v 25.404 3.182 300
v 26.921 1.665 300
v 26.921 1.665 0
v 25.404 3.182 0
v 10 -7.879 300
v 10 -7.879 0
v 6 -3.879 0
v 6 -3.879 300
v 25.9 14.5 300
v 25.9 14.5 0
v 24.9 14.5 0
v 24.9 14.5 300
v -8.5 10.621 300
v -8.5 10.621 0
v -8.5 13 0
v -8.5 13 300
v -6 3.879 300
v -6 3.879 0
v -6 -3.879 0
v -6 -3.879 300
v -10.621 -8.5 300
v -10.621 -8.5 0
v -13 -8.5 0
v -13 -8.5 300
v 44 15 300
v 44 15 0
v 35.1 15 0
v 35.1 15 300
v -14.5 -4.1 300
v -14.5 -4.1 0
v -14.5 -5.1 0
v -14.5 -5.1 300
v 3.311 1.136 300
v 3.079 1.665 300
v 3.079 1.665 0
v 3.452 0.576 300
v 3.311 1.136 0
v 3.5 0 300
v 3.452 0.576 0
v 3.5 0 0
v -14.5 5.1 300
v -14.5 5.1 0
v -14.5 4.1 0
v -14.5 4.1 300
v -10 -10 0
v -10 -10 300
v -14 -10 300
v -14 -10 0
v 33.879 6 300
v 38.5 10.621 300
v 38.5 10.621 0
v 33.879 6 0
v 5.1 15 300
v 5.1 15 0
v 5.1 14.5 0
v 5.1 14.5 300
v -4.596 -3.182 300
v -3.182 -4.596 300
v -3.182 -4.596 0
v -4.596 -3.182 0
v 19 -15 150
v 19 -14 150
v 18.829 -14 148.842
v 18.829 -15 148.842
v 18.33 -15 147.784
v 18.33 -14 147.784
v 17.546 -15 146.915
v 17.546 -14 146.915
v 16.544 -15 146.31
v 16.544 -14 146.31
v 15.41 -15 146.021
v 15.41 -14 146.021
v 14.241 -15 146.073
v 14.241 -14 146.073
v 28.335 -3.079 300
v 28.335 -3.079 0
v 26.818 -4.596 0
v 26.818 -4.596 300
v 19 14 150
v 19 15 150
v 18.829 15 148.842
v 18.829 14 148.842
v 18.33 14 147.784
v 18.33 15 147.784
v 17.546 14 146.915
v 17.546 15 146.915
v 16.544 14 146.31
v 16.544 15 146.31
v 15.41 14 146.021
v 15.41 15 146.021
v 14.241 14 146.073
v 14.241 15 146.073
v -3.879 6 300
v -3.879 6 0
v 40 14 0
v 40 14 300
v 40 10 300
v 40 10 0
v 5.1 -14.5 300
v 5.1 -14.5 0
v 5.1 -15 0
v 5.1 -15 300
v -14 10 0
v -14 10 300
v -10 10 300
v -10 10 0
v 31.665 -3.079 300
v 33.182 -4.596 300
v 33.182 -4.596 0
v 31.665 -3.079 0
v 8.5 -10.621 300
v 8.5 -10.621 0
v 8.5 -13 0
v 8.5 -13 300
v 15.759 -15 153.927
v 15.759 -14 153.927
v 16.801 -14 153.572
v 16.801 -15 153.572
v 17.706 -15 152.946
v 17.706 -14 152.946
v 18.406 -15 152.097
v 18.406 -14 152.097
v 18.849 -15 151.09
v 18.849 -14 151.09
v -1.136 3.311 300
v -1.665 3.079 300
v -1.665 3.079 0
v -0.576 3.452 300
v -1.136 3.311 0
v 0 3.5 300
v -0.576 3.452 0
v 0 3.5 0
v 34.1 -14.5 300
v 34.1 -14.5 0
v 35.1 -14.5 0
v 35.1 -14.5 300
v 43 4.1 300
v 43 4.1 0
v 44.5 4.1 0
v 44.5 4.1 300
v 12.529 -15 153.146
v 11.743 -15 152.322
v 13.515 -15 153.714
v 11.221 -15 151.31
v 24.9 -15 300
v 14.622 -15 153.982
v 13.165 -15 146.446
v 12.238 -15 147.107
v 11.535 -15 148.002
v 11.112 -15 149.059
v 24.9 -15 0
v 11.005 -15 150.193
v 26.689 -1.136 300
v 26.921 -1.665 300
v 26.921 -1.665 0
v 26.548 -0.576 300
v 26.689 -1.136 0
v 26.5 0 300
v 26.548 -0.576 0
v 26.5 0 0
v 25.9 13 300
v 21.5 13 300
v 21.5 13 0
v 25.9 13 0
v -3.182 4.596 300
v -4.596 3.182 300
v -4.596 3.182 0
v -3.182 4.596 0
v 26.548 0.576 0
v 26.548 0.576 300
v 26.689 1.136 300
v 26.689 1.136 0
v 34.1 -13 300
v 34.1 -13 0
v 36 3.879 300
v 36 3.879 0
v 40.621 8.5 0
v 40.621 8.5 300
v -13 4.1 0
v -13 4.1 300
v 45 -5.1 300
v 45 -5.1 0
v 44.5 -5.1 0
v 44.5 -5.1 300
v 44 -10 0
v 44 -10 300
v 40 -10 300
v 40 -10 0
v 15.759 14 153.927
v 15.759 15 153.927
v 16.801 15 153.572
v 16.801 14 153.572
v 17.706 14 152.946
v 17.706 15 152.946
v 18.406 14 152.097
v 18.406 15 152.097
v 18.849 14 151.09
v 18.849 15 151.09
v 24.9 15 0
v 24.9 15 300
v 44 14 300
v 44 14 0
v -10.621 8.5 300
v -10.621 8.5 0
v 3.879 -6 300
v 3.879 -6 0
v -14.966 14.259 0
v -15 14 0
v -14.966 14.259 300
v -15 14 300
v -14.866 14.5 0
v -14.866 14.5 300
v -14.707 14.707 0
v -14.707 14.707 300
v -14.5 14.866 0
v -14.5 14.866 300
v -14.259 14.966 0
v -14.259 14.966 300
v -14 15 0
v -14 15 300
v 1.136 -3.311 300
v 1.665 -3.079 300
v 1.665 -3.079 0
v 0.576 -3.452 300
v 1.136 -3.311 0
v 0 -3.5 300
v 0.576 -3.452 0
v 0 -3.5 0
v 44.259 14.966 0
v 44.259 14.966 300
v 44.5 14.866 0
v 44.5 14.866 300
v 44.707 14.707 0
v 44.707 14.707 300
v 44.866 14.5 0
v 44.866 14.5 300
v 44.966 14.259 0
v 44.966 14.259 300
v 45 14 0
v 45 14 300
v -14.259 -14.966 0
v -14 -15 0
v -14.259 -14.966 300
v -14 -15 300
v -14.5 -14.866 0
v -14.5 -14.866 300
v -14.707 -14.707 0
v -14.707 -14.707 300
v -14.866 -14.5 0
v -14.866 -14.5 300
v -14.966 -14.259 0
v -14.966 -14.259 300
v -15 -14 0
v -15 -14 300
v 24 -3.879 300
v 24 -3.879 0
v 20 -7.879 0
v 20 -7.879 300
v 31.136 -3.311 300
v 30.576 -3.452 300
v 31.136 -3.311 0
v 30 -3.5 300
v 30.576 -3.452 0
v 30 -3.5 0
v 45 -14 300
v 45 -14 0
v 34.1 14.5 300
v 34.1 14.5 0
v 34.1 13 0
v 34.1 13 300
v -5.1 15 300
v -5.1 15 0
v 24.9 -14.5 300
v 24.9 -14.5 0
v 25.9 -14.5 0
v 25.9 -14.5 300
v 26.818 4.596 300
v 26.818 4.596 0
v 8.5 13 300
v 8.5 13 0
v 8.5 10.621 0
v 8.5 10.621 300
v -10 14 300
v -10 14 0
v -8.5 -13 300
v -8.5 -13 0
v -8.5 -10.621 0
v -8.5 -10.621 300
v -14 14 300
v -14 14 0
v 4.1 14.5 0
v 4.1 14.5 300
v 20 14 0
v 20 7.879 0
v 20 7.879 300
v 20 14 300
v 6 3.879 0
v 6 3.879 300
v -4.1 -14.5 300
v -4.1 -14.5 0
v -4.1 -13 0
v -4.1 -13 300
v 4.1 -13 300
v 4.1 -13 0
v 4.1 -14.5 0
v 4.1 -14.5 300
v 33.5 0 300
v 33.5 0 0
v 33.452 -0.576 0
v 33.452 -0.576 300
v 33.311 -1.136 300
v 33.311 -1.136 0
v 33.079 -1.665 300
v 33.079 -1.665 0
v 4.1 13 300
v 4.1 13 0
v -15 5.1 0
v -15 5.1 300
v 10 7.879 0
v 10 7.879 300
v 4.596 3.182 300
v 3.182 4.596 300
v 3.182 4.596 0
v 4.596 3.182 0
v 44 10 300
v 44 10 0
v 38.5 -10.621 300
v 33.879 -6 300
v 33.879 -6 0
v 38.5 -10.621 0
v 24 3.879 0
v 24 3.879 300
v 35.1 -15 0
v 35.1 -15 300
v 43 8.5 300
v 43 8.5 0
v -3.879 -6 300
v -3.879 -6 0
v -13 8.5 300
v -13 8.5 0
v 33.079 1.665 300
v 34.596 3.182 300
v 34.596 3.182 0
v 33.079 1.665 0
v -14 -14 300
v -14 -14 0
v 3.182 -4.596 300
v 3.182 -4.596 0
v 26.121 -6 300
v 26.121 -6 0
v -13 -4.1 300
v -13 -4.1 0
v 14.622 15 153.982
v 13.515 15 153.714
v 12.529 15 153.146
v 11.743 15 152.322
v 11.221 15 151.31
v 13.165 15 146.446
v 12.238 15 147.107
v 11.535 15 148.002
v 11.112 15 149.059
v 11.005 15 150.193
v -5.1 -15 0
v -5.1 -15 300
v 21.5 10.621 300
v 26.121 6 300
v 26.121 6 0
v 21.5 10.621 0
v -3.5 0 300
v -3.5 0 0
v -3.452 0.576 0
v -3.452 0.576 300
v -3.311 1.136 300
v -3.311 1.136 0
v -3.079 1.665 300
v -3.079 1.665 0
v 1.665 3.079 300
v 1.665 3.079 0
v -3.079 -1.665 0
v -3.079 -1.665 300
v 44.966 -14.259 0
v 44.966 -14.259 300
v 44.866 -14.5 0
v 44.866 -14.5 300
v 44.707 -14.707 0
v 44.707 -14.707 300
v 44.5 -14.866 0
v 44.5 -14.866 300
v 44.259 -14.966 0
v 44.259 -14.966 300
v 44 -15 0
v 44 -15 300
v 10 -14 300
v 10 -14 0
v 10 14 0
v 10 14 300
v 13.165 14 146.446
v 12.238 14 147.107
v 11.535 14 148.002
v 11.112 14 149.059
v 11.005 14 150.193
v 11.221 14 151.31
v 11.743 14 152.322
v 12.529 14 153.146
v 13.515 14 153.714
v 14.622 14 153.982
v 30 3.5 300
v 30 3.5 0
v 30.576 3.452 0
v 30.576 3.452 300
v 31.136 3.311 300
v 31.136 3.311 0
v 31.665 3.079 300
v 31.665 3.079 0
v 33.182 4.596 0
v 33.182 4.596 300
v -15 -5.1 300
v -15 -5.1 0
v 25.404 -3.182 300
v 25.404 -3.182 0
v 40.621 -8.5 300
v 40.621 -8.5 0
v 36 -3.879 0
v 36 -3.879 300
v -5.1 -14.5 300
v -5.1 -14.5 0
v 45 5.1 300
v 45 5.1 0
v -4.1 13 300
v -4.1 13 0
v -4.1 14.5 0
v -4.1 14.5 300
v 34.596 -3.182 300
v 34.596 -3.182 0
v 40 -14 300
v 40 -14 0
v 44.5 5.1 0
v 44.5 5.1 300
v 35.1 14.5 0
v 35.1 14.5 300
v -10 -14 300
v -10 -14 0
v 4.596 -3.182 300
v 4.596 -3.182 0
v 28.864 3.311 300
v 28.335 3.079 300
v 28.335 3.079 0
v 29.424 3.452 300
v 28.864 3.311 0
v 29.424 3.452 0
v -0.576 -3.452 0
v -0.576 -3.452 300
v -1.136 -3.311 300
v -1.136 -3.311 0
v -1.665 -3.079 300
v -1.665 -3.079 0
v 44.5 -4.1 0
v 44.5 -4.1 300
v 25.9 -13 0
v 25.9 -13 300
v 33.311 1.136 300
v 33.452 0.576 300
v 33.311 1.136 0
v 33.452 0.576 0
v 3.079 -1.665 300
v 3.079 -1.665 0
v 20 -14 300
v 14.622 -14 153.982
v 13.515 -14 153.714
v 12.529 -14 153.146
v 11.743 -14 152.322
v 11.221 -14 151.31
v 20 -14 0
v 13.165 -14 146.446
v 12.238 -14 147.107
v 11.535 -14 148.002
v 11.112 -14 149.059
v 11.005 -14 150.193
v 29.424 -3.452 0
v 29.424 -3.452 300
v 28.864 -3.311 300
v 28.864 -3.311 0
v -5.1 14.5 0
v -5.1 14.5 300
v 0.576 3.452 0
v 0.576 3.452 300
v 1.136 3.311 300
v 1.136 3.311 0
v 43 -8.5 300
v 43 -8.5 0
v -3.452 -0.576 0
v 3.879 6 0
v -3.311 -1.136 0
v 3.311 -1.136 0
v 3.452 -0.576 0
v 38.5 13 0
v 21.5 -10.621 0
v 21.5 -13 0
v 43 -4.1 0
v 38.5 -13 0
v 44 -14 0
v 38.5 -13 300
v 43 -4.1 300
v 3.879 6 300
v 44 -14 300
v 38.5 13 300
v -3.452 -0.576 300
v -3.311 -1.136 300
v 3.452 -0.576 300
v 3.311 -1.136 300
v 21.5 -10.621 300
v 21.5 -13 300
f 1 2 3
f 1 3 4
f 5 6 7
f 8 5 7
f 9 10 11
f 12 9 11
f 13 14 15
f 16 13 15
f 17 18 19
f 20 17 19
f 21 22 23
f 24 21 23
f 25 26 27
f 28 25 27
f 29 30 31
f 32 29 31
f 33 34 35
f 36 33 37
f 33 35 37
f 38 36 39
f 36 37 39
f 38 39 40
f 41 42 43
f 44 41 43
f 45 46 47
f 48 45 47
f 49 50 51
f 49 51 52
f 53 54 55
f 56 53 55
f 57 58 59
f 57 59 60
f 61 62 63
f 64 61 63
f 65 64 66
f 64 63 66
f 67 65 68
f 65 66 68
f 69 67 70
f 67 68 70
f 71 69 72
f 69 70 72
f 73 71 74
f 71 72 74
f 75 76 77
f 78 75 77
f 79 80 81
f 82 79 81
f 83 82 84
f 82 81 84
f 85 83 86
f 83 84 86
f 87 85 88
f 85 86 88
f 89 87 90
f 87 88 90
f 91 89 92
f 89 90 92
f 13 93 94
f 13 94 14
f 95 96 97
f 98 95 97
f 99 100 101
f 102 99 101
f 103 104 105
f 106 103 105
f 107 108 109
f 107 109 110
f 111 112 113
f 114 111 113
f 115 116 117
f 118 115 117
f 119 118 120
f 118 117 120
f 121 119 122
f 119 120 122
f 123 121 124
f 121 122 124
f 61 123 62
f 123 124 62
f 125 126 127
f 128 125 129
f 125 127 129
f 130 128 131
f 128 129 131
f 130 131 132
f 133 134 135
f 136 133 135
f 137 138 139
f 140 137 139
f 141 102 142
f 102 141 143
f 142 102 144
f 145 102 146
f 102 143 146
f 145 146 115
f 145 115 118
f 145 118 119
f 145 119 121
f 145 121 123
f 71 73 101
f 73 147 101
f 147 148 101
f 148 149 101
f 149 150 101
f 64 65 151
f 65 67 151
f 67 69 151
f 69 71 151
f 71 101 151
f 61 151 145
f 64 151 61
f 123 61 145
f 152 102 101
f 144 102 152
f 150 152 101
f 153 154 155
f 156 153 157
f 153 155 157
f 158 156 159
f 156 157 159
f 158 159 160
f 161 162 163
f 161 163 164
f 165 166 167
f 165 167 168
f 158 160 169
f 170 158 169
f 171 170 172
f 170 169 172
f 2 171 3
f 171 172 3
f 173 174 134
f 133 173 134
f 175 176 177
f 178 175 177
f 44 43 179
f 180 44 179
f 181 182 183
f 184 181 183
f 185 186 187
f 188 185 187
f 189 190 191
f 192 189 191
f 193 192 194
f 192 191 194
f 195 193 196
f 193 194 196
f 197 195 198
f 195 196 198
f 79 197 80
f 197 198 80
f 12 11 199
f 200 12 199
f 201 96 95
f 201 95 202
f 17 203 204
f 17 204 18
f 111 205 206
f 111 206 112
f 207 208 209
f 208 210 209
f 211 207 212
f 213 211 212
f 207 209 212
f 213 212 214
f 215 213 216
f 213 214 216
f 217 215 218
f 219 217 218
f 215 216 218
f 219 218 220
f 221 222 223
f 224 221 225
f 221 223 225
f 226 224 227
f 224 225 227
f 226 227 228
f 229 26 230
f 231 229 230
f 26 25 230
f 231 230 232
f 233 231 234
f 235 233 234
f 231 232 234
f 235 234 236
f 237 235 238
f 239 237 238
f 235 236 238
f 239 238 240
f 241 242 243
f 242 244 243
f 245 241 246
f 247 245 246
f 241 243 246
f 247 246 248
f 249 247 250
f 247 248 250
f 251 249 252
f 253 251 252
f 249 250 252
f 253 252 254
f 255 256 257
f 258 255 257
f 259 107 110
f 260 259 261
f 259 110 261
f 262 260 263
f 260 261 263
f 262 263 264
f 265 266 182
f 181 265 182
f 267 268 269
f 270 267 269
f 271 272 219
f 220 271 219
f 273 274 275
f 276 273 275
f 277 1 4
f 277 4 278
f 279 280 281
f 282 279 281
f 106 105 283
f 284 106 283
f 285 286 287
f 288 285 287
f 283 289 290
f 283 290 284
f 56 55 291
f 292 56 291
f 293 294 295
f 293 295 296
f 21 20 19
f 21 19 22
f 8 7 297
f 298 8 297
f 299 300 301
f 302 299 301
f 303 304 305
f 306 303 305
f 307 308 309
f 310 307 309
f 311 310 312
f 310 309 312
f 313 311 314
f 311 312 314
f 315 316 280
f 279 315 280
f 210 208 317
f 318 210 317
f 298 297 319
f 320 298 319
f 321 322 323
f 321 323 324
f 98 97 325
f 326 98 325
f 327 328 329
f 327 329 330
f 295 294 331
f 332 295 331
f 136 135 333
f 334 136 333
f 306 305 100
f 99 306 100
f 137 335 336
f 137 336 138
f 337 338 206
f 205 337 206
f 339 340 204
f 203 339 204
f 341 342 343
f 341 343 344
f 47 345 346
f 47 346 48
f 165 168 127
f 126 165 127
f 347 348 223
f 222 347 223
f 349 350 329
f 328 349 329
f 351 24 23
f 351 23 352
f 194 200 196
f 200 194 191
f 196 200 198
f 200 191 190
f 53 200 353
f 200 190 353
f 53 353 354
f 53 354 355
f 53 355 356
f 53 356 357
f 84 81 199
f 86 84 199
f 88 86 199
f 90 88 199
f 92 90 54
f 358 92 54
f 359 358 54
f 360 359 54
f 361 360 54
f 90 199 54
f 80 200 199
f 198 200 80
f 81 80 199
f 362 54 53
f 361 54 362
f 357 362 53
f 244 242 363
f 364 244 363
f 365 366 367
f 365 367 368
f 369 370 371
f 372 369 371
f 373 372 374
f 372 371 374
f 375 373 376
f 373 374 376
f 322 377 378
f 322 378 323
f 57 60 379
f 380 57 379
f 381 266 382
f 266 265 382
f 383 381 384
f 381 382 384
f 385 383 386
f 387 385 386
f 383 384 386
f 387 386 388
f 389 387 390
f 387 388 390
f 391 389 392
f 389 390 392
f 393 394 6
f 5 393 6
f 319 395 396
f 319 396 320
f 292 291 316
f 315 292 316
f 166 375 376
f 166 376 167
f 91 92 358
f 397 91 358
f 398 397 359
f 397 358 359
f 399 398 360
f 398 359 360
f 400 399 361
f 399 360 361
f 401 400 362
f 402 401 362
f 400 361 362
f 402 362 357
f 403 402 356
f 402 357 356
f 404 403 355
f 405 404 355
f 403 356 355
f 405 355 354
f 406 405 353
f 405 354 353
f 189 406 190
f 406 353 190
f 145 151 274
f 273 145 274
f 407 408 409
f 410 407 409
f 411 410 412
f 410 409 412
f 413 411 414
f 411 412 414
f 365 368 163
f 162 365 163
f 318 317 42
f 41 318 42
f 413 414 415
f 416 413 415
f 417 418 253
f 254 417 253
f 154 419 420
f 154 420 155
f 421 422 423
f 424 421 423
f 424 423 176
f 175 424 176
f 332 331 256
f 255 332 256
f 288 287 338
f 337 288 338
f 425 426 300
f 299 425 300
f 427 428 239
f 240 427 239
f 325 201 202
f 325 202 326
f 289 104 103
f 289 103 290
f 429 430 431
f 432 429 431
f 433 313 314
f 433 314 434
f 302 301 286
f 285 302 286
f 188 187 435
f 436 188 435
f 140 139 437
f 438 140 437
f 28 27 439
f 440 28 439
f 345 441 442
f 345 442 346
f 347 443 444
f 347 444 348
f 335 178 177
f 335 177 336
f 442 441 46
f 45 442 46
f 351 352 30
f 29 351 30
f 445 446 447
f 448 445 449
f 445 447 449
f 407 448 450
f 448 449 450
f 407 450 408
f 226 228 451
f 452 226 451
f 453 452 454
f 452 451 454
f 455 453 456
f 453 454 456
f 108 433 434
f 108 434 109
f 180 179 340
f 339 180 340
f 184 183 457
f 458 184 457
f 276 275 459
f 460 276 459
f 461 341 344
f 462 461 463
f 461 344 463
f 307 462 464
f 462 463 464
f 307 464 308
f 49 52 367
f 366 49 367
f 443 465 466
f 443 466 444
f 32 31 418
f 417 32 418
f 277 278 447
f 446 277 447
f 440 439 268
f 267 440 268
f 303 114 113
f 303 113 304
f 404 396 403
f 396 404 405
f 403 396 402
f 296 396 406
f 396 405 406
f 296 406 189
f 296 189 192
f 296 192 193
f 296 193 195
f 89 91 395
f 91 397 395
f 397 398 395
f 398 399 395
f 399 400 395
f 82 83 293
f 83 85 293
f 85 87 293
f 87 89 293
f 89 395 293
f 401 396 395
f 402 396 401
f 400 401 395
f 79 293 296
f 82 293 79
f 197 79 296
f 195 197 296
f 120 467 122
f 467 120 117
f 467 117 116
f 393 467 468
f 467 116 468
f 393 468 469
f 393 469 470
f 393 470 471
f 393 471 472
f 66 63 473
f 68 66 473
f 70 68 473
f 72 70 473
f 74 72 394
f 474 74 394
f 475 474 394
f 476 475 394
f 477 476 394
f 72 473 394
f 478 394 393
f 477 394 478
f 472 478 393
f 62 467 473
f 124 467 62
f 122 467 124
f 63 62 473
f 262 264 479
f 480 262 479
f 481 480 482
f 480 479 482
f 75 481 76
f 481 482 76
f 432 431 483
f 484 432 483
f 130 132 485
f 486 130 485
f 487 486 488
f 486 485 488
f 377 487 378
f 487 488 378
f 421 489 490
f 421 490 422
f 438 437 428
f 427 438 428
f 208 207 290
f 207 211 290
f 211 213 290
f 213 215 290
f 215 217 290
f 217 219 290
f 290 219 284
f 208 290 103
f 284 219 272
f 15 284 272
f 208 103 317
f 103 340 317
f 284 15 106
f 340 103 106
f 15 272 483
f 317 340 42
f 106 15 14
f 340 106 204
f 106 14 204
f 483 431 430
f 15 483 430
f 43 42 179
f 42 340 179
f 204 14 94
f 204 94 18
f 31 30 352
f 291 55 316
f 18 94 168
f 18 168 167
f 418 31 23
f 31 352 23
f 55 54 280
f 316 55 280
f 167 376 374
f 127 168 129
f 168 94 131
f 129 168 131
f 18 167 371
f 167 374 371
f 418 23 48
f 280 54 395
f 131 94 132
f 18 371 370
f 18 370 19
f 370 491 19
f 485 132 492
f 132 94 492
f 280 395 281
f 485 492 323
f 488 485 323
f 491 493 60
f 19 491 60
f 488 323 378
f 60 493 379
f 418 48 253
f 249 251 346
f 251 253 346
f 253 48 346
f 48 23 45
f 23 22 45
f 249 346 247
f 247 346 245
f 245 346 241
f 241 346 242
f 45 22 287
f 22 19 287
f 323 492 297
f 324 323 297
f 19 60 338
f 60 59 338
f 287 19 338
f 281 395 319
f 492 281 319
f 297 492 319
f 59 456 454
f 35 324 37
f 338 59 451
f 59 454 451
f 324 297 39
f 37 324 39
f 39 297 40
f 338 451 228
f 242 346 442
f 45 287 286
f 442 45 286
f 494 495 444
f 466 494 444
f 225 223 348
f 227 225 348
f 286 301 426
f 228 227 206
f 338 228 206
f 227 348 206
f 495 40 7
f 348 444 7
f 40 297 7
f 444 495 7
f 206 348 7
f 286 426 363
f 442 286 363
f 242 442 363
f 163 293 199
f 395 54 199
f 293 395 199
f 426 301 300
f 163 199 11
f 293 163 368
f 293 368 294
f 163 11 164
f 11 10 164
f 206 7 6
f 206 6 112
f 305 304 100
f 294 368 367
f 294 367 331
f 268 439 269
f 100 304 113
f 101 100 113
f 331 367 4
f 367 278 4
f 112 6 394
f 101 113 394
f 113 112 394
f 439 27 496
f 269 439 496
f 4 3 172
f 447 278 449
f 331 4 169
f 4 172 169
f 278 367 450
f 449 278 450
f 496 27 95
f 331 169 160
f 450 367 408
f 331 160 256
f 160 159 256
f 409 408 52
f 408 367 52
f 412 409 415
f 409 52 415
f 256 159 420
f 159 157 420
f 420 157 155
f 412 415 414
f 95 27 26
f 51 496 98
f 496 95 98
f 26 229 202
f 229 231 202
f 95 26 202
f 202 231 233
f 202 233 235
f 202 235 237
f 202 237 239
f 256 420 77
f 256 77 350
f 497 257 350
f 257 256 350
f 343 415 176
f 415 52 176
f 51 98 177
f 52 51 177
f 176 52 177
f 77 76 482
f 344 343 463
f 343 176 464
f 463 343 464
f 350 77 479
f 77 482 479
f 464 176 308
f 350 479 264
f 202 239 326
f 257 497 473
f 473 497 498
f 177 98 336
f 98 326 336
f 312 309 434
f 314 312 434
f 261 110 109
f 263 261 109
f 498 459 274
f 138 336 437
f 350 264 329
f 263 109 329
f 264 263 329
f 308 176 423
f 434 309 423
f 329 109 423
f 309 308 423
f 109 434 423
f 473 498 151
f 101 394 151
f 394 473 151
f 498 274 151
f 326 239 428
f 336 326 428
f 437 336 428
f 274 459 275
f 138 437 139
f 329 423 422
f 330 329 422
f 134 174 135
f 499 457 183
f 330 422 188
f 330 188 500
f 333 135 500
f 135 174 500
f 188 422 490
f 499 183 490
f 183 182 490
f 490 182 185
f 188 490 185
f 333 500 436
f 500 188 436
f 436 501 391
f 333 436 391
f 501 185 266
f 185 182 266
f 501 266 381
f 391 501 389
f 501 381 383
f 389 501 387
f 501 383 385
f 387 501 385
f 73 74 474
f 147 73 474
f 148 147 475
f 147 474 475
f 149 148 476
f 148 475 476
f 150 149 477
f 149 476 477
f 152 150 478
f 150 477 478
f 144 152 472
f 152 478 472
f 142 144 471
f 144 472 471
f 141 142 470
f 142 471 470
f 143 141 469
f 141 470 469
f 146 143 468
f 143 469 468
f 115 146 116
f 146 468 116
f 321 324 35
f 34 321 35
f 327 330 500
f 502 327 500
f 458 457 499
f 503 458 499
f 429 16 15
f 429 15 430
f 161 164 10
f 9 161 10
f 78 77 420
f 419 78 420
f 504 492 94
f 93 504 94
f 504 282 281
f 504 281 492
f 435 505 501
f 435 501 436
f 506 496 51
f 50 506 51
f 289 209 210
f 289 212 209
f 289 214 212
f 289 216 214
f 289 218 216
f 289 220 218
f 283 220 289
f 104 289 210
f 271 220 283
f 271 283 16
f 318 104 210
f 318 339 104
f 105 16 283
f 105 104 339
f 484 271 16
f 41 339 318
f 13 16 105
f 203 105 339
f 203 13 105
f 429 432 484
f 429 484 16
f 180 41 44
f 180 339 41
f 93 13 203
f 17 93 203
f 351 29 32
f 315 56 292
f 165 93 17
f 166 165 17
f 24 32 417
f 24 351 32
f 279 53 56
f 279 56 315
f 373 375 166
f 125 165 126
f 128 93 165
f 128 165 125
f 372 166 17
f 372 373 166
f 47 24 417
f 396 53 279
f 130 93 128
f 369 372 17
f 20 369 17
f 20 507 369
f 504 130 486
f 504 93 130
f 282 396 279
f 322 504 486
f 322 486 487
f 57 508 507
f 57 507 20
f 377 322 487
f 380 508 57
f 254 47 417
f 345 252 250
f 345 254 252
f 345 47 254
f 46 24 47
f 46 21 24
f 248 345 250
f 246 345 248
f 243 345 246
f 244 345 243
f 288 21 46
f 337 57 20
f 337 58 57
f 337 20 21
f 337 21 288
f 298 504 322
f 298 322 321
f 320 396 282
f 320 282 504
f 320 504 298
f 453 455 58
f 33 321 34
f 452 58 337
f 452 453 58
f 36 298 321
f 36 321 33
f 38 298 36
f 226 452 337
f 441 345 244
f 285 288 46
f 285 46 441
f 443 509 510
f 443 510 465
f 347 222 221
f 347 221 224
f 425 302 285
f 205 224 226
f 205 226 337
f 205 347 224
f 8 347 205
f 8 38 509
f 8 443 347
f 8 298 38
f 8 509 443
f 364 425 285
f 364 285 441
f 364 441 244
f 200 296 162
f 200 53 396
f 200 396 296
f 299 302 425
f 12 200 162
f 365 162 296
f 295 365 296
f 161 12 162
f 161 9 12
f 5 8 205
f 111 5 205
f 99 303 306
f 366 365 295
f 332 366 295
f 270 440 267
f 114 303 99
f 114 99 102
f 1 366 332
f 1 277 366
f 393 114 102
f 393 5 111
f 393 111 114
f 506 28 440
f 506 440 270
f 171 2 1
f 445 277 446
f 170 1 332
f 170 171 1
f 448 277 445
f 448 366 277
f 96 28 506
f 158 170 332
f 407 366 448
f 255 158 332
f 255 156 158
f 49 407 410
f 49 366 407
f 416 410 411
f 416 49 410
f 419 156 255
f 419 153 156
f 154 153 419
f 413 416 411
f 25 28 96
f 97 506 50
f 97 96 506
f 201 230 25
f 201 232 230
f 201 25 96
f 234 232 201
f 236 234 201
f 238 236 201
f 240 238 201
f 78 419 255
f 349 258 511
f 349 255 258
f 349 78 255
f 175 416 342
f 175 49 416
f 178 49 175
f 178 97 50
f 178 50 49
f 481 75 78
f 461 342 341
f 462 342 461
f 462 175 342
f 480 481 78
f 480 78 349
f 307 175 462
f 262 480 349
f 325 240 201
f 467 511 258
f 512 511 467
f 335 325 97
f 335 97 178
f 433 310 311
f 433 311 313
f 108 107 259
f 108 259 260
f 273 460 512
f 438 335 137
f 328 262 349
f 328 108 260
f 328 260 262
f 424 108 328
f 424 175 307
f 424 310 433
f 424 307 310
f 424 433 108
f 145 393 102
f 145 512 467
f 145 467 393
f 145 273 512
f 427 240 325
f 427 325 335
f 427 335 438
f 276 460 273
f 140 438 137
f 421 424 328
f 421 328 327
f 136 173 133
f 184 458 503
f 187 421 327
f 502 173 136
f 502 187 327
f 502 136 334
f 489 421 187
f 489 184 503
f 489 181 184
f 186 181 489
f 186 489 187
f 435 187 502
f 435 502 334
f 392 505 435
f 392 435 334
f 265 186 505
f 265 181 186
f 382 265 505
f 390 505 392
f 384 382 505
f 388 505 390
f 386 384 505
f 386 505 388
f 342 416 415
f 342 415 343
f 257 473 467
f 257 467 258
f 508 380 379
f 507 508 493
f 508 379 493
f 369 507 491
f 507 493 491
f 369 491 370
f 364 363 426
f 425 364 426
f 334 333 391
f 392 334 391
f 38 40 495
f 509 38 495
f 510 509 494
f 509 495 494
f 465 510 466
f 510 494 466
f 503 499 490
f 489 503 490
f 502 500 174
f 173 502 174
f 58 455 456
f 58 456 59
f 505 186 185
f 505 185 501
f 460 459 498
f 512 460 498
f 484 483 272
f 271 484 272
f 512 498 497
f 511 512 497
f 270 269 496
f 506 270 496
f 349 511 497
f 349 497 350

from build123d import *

# Parameters (mm, degrees)
ESBO_O1_W                      = 4
ESBO_O1_H                      = 4
RESSALTO_EXTRUS_O1_DEPTH       = 300
PADR_OCIRCULAR1_COUNT          = 4
PADR_O_LINEAR1_COUNT           = 2
PADR_O_LINEAR1_PITCH           = 30
PADR_O_LINEAR1_COPY_1_SKETCH_W = 4
PADR_O_LINEAR1_COPY_1_SKETCH_H = 4
PADR_O_LINEAR1_COPY_1_DEPTH    = 300
PADR_O_LINEAR1_COPY_2_SKETCH_W = 4
PADR_O_LINEAR1_COPY_2_SKETCH_H = 4
PADR_O_LINEAR1_COPY_2_DEPTH    = 300
PADR_O_LINEAR1_COPY_3_SKETCH_W = 4
PADR_O_LINEAR1_COPY_3_SKETCH_H = 4
PADR_O_LINEAR1_COPY_3_DEPTH    = 300
ESBO_O4_W                      = 10
ESBO_O4_H                      = 28
CORTE_EXTRUS_O1_DEPTH          = 304.72685097
FILETE1_R                      = 1
CUT_EXTRUDE1_DEPTH             = 305.836021494


with BuildPart() as part:
    # Esboço1 → Ressalto-extrusão1 (new body)
    with BuildSketch(Plane.XY):
        with BuildLine():
            ThreePointArc((-1.664601464, 3.078815026), (-0.858529967, 3.393070335), (0, 3.5))
            Line((0, 3.5), (0, 6))
            Line((0, 6), (-3.878679656, 6))
            Line((-3.878679656, 6), (-8.5, 10.621320344))
            Line((-8.5, 10.621320344), (-8.5, 13))
            Line((-8.5, 13), (-4.1, 13))
            Line((-4.1, 13), (-4.1, 14.5))
            Line((-4.1, 14.5), (-5.1, 14.5))
            Line((-5.1, 14.5), (-5.1, 15))
            Line((-5.1, 15), (-15, 15))
            Line((-15, 15), (-15, 5.1))
            Line((-15, 5.1), (-14.5, 5.1))
            Line((-14.5, 5.1), (-14.5, 4.1))
            Line((-14.5, 4.1), (-13, 4.1))
            Line((-13, 4.1), (-13, 8.5))
            Line((-13, 8.5), (-10.621320344, 8.5))
            Line((-10.621320344, 8.5), (-6, 3.878679656))
            Line((-6, 3.878679656), (-6, 0))
            Line((-6, 0), (-3.5, 0))
            ThreePointArc((-3.5, 0), (-3.393070335, 0.858529967), (-3.078815026, 1.664601464))
            Line((-3.078815026, 1.664601464), (-4.596194078, 3.181980515))
            Line((-4.596194078, 3.181980515), (-3.181980515, 4.596194078))
            Line((-3.181980515, 4.596194078), (-1.664601464, 3.078815026))
        make_face()
        with Locations((-12, 12)):
            Rectangle(ESBO_O1_W, ESBO_O1_H, mode=Mode.SUBTRACT)
    ressalto_extrus_o1 = extrude(amount=RESSALTO_EXTRUS_O1_DEPTH)

    # PadrãoCircular1: Ressalto-extrusão1 ×4 about axis
    padr_ocircular1_axis = Axis((0, 0, 0), (0, 0, 1))
    for i in range(1, PADR_OCIRCULAR1_COUNT):
        add(ressalto_extrus_o1.rotate(padr_ocircular1_axis, i * 360 / PADR_OCIRCULAR1_COUNT))

    # Padrão linear1: Ressalto-extrusão1 ×2
    with Locations(*[(i * PADR_O_LINEAR1_PITCH, 0, 0) for i in range(1, PADR_O_LINEAR1_COUNT)]):
        add(ressalto_extrus_o1)

    # Padrão linear1 copy 1 sketch → Padrão linear1 copy 1 (add)
    with BuildSketch(Plane(origin=(30, 0, 0), x_dir=(0, 1, 0), z_dir=(0, 0, 1))):
        with BuildLine():
            ThreePointArc((-1.664601464, 3.078815026), (-0.858529967, 3.393070335), (0, 3.5))
            Line((0, 3.5), (0, 6))
            Line((0, 6), (-3.878679656, 6))
            Line((-3.878679656, 6), (-8.5, 10.621320344))
            Line((-8.5, 10.621320344), (-8.5, 13))
            Line((-8.5, 13), (-4.1, 13))
            Line((-4.1, 13), (-4.1, 14.5))
            Line((-4.1, 14.5), (-5.1, 14.5))
            Line((-5.1, 14.5), (-5.1, 15))
            Line((-5.1, 15), (-15, 15))
            Line((-15, 15), (-15, 5.1))
            Line((-15, 5.1), (-14.5, 5.1))
            Line((-14.5, 5.1), (-14.5, 4.1))
            Line((-14.5, 4.1), (-13, 4.1))
            Line((-13, 4.1), (-13, 8.5))
            Line((-13, 8.5), (-10.621320344, 8.5))
            Line((-10.621320344, 8.5), (-6, 3.878679656))
            Line((-6, 3.878679656), (-6, 0))
            Line((-6, 0), (-3.5, 0))
            ThreePointArc((-3.5, 0), (-3.393070335, 0.858529967), (-3.078815026, 1.664601464))
            Line((-3.078815026, 1.664601464), (-4.596194078, 3.181980515))
            Line((-4.596194078, 3.181980515), (-3.181980515, 4.596194078))
            Line((-3.181980515, 4.596194078), (-1.664601464, 3.078815026))
        make_face()
        with Locations((-12, 12)):
            Rectangle(PADR_O_LINEAR1_COPY_1_SKETCH_W, PADR_O_LINEAR1_COPY_1_SKETCH_H, mode=Mode.SUBTRACT)
    extrude(amount=PADR_O_LINEAR1_COPY_1_DEPTH)

    # Padrão linear1 copy 2 sketch → Padrão linear1 copy 2 (add)
    with BuildSketch(Plane(origin=(30, 0, 0), x_dir=(-1, 0, 0), z_dir=(0, 0, 1))):
        with BuildLine():
            ThreePointArc((-1.664601464, 3.078815026), (-0.858529967, 3.393070335), (0, 3.5))
            Line((0, 3.5), (0, 6))
            Line((0, 6), (-3.878679656, 6))
            Line((-3.878679656, 6), (-8.5, 10.621320344))
            Line((-8.5, 10.621320344), (-8.5, 13))
            Line((-8.5, 13), (-4.1, 13))
            Line((-4.1, 13), (-4.1, 14.5))
            Line((-4.1, 14.5), (-5.1, 14.5))
            Line((-5.1, 14.5), (-5.1, 15))
            Line((-5.1, 15), (-15, 15))
            Line((-15, 15), (-15, 5.1))
            Line((-15, 5.1), (-14.5, 5.1))
            Line((-14.5, 5.1), (-14.5, 4.1))
            Line((-14.5, 4.1), (-13, 4.1))
            Line((-13, 4.1), (-13, 8.5))
            Line((-13, 8.5), (-10.621320344, 8.5))
            Line((-10.621320344, 8.5), (-6, 3.878679656))
            Line((-6, 3.878679656), (-6, 0))
            Line((-6, 0), (-3.5, 0))
            ThreePointArc((-3.5, 0), (-3.393070335, 0.858529967), (-3.078815026, 1.664601464))
            Line((-3.078815026, 1.664601464), (-4.596194078, 3.181980515))
            Line((-4.596194078, 3.181980515), (-3.181980515, 4.596194078))
            Line((-3.181980515, 4.596194078), (-1.664601464, 3.078815026))
        make_face()
        with Locations((-12, 12)):
            Rectangle(PADR_O_LINEAR1_COPY_2_SKETCH_W, PADR_O_LINEAR1_COPY_2_SKETCH_H, mode=Mode.SUBTRACT)
    extrude(amount=PADR_O_LINEAR1_COPY_2_DEPTH)

    # Padrão linear1 copy 3 sketch → Padrão linear1 copy 3 (add)
    with BuildSketch(Plane(origin=(30, 0, 0), x_dir=(0, -1, 0), z_dir=(0, 0, 1))):
        with BuildLine():
            ThreePointArc((-1.664601464, 3.078815026), (-0.858529967, 3.393070335), (0, 3.5))
            Line((0, 3.5), (0, 6))
            Line((0, 6), (-3.878679656, 6))
            Line((-3.878679656, 6), (-8.5, 10.621320344))
            Line((-8.5, 10.621320344), (-8.5, 13))
            Line((-8.5, 13), (-4.1, 13))
            Line((-4.1, 13), (-4.1, 14.5))
            Line((-4.1, 14.5), (-5.1, 14.5))
            Line((-5.1, 14.5), (-5.1, 15))
            Line((-5.1, 15), (-15, 15))
            Line((-15, 15), (-15, 5.1))
            Line((-15, 5.1), (-14.5, 5.1))
            Line((-14.5, 5.1), (-14.5, 4.1))
            Line((-14.5, 4.1), (-13, 4.1))
            Line((-13, 4.1), (-13, 8.5))
            Line((-13, 8.5), (-10.621320344, 8.5))
            Line((-10.621320344, 8.5), (-6, 3.878679656))
            Line((-6, 3.878679656), (-6, 0))
            Line((-6, 0), (-3.5, 0))
            ThreePointArc((-3.5, 0), (-3.393070335, 0.858529967), (-3.078815026, 1.664601464))
            Line((-3.078815026, 1.664601464), (-4.596194078, 3.181980515))
            Line((-4.596194078, 3.181980515), (-3.181980515, 4.596194078))
            Line((-3.181980515, 4.596194078), (-1.664601464, 3.078815026))
        make_face()
        with Locations((-12, 12)):
            Rectangle(PADR_O_LINEAR1_COPY_3_SKETCH_W, PADR_O_LINEAR1_COPY_3_SKETCH_H, mode=Mode.SUBTRACT)
    extrude(amount=PADR_O_LINEAR1_COPY_3_DEPTH)

    # Esboço4 → Corte-extrusão1 (cut, through all)
    with BuildSketch(Plane(origin=(0, 0, 0), x_dir=(-1, 0, 0), z_dir=(0, 0, -1))):
        with Locations((-15, 0)):
            Rectangle(ESBO_O4_W, ESBO_O4_H)
    extrude(amount=-CORTE_EXTRUS_O1_DEPTH, mode=Mode.SUBTRACT)

    # Filete1
    filete1_edges = [part.edges().sort_by_distance(p)[0] for p in [
        (45, -15, 150),
        (45, 15, 150),
        (-15, 15, 150),
        (-15, -15, 150),
    ]]
    fillet(filete1_edges, radius=FILETE1_R)

    # Sketch1 → Cut-Extrude1 (cut, through all)
    with BuildSketch(Plane(origin=(0, 15, 0), x_dir=(1, 0, 0), z_dir=(0, 1, 0))):
        with BuildLine():
            ThreePointArc((19, -150), (17.54586978, -146.914785735), (14.24072647, -146.072723118))
            Line((14.24072647, -146.072723118), (15.75927353, -153.927276882))
            ThreePointArc((15.75927353, -153.927276882), (18.085214265, -152.54586978), (19, -150))
        make_face()
        with BuildLine():
            Line((15.75927353, -153.927276882), (14.24072647, -146.072723118))
            ThreePointArc((14.24072647, -146.072723118), (11.072723118, -150.75927353), (15.75927353, -153.927276882))
        make_face()
    extrude(amount=-CUT_EXTRUDE1_DEPTH, mode=Mode.SUBTRACT)


solid = part.part
